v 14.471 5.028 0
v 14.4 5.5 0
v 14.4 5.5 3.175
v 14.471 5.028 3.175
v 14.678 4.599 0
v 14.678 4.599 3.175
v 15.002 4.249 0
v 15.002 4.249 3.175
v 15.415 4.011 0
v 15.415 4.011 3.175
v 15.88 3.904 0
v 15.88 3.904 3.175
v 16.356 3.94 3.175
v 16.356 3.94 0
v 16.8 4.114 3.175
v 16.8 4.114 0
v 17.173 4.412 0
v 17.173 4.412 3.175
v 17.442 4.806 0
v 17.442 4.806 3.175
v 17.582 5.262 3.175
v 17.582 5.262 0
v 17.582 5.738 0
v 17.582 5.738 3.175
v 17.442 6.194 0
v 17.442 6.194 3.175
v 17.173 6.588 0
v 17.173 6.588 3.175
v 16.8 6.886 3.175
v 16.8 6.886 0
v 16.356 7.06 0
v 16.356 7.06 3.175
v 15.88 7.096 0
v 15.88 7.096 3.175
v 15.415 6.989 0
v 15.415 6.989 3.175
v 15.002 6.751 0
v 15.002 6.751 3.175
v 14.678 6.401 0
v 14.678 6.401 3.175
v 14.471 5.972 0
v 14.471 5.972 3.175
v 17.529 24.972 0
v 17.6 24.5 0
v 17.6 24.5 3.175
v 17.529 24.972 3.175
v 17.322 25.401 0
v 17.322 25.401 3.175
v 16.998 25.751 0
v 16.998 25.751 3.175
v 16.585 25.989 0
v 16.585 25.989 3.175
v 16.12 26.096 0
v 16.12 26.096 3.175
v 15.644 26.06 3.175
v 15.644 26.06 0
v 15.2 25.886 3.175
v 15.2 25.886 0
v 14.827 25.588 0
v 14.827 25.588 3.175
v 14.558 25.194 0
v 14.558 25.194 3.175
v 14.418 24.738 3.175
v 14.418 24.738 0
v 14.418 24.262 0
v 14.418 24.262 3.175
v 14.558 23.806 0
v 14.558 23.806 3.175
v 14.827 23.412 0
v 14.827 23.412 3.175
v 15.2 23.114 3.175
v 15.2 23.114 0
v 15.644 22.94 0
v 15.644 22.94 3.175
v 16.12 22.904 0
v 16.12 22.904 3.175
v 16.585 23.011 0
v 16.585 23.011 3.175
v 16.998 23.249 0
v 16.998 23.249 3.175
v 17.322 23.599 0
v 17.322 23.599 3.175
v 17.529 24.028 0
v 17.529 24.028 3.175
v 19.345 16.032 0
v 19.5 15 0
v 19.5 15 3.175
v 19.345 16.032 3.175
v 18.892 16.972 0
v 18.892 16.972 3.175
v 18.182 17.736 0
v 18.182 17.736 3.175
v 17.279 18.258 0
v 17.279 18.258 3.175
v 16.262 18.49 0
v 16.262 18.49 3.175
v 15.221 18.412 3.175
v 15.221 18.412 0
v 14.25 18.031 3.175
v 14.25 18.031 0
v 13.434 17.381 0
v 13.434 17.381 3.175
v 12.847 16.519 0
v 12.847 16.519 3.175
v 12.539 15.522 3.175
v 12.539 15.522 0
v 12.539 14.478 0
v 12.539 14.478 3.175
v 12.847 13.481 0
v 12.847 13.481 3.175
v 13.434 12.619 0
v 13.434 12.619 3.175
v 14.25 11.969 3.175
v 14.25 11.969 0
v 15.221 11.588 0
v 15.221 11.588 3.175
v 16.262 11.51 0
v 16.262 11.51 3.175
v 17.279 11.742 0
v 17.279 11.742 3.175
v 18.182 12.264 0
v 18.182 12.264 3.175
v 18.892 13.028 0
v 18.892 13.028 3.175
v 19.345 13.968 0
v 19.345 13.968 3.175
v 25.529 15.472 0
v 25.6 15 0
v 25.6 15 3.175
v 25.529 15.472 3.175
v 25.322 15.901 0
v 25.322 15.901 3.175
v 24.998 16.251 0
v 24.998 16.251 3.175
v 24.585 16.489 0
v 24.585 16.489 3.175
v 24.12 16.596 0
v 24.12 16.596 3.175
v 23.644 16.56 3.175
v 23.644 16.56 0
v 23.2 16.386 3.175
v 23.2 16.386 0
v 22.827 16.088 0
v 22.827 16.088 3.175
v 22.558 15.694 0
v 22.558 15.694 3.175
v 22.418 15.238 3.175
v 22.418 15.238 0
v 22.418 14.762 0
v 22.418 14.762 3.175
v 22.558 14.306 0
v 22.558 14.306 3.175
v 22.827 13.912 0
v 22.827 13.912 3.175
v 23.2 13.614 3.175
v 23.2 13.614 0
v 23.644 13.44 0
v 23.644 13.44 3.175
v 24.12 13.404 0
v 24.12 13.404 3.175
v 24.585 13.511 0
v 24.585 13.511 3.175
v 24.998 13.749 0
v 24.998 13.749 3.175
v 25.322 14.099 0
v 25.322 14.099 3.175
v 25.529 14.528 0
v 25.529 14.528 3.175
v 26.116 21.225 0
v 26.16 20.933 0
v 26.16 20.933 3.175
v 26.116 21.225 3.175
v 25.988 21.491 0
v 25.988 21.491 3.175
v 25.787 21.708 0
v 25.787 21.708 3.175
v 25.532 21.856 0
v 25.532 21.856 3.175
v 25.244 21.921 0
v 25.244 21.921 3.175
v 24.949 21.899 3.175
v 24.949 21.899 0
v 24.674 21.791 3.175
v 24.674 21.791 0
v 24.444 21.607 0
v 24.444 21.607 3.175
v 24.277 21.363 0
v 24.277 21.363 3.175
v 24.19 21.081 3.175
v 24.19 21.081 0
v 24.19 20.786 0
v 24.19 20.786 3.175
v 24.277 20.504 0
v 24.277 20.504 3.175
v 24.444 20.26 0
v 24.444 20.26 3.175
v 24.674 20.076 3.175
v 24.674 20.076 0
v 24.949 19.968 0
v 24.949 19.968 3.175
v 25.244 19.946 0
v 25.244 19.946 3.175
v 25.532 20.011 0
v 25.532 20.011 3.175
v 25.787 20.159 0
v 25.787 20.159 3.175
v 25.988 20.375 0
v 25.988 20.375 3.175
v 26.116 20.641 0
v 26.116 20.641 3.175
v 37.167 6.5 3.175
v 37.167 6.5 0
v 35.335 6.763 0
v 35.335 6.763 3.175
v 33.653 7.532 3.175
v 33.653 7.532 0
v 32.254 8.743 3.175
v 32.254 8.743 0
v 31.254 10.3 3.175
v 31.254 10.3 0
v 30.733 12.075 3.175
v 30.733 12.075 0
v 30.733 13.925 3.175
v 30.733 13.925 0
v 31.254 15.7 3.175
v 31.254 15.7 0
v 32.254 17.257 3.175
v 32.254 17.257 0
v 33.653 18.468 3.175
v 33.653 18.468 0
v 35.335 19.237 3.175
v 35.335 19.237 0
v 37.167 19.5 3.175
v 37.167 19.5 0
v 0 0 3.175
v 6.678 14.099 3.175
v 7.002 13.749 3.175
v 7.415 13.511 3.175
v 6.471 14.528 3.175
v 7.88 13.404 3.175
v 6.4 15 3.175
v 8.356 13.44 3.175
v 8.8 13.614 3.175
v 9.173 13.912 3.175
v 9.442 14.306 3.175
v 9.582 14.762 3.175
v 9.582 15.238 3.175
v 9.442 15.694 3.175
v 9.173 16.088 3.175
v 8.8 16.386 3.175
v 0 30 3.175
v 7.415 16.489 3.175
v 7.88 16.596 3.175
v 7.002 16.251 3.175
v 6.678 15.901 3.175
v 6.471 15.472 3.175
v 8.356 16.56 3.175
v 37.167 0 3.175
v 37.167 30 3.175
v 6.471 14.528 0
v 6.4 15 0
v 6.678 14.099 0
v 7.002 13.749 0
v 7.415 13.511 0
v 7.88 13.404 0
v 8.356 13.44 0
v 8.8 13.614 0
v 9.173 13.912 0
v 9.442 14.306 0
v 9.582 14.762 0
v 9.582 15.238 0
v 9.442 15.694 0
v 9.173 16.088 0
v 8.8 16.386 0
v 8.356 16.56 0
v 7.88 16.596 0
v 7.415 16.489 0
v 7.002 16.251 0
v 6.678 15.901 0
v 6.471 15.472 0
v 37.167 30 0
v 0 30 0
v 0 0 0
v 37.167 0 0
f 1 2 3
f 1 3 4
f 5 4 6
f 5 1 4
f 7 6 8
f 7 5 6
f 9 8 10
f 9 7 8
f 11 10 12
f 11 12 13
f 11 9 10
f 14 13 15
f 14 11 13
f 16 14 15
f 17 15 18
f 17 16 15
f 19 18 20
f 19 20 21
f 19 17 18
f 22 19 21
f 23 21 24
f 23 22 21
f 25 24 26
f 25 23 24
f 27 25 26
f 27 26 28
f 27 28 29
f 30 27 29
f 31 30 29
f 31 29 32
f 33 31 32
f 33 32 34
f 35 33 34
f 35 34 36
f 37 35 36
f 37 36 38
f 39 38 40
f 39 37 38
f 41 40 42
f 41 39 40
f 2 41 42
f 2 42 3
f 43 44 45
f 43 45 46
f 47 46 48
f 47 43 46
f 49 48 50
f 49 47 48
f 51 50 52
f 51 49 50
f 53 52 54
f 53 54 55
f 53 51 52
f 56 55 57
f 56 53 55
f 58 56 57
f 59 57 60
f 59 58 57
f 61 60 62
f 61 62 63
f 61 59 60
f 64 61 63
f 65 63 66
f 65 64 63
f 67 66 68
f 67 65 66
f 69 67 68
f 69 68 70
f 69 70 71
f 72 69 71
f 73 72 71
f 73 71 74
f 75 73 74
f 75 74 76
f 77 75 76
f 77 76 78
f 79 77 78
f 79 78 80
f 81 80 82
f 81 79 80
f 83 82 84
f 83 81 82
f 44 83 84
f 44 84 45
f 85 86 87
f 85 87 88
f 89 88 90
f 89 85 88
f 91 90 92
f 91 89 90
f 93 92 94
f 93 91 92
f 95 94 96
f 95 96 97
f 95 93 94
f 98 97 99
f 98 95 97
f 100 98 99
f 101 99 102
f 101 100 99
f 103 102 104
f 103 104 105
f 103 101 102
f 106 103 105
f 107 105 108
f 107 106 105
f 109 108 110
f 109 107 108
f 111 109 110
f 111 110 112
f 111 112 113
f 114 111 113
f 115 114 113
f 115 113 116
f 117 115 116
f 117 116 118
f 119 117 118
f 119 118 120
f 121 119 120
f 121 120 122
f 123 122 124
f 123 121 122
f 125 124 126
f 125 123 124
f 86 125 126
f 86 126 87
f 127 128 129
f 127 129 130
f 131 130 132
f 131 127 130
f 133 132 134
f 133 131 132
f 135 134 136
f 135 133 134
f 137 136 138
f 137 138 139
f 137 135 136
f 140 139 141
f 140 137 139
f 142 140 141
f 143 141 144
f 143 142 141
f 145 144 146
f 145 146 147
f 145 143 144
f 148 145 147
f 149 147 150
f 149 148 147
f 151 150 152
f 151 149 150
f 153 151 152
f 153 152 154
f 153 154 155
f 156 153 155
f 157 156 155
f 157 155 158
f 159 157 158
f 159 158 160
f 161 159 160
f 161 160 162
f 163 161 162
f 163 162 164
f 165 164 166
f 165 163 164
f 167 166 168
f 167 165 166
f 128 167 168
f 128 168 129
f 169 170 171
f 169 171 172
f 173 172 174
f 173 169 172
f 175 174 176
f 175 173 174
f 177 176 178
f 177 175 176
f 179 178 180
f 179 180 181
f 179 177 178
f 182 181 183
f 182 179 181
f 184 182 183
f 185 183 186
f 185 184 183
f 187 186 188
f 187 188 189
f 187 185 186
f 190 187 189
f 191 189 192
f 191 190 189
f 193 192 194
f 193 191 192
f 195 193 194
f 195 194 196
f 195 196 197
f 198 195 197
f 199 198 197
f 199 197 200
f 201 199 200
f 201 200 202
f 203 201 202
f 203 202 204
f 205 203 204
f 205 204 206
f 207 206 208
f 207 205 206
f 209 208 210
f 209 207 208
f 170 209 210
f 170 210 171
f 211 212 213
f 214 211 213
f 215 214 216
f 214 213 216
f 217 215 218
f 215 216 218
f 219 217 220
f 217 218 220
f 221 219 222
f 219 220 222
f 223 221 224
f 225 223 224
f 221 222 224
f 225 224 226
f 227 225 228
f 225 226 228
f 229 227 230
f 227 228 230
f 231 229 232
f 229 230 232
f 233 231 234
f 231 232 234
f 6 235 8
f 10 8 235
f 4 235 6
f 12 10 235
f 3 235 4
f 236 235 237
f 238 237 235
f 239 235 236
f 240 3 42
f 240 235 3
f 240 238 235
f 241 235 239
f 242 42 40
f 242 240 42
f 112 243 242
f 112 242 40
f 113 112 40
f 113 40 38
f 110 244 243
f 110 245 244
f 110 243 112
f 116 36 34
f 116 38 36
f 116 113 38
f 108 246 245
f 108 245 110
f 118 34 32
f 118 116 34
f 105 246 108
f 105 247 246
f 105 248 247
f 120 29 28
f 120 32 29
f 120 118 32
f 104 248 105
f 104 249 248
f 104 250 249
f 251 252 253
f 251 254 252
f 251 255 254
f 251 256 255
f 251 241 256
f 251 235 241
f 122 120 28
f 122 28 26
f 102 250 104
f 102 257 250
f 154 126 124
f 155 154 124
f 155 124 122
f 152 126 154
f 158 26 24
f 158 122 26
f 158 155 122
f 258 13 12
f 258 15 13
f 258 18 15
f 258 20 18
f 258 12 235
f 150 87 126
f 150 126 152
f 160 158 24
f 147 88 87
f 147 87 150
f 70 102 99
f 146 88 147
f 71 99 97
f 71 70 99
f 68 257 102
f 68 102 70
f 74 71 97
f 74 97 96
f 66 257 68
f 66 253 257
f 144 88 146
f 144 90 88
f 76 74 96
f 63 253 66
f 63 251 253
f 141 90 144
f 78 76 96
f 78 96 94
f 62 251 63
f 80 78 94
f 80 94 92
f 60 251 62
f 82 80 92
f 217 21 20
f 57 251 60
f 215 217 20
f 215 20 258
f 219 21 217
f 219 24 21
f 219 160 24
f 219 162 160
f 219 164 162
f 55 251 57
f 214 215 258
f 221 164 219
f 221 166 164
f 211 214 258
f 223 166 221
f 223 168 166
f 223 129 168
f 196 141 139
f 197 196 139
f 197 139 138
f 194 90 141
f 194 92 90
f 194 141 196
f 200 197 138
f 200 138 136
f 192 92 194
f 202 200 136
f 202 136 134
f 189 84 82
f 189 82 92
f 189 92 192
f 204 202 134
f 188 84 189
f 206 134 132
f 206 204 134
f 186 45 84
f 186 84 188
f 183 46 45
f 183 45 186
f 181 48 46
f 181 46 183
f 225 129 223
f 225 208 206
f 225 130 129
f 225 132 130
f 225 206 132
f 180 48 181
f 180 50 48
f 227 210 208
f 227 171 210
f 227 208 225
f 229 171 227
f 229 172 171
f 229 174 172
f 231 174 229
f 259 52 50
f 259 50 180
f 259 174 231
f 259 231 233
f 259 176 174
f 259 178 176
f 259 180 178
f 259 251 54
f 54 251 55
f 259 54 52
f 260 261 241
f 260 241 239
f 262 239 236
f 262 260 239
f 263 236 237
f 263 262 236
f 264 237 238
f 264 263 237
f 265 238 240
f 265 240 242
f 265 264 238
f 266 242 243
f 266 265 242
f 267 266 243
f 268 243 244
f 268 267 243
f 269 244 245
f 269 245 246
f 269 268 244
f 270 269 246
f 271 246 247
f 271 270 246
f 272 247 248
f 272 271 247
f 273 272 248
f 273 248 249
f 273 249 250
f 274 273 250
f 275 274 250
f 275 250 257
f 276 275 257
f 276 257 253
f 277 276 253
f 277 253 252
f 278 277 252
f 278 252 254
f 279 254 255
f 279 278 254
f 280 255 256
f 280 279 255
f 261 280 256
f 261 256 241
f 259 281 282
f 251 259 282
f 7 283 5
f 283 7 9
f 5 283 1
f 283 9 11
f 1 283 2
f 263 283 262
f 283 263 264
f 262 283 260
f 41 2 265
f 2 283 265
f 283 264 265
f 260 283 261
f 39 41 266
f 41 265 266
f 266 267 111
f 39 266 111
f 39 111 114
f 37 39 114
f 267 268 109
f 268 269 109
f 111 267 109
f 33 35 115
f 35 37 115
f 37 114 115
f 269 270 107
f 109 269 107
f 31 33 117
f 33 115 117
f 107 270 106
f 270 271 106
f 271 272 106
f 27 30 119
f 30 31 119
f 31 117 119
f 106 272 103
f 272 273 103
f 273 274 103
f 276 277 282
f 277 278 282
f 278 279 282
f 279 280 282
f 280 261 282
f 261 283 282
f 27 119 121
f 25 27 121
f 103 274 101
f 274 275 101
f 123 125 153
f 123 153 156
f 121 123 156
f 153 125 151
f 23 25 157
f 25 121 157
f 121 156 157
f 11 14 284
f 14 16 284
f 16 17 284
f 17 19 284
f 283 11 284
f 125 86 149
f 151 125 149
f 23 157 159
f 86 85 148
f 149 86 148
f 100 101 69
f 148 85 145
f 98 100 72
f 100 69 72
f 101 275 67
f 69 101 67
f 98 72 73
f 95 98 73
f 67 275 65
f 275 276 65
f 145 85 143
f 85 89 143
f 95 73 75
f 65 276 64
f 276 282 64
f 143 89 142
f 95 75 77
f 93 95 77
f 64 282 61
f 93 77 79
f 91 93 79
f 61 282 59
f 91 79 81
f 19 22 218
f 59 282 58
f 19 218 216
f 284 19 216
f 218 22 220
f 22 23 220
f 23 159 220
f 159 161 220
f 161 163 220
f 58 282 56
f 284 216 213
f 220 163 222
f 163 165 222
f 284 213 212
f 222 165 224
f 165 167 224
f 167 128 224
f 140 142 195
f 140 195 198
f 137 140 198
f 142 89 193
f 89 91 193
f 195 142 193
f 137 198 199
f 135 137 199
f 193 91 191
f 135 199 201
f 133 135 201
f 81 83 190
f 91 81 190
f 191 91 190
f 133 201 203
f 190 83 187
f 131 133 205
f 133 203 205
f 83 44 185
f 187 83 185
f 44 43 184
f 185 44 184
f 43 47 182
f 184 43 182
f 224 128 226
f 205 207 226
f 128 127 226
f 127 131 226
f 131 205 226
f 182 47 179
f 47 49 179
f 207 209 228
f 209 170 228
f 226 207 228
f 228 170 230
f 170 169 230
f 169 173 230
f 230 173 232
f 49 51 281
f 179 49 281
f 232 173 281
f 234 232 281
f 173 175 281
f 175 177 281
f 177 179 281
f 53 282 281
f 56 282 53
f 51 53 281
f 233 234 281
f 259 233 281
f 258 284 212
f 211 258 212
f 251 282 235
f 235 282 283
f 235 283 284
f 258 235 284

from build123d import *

# Parameters (mm, degrees)
SKETCH1_R           = 0.9906
SKETCH1_R_2         = 1.6
SKETCH1_R_3         = 3.5
BOSS_EXTRUDE2_DEPTH = 3.175


with BuildPart() as part:
    # Sketch1 → Boss-Extrude2 (new body)
    with BuildSketch(Plane.XY):
        with BuildLine():
            Line((0, 0), (37.166699296, 0))
            Line((37.166699296, 0), (37.166699296, 6.5))
            ThreePointArc((37.166699296, 6.5), (30.666699296, 13), (37.166699296, 19.5))
            Line((37.166699296, 19.5), (37.166699296, 30))
            Line((37.166699296, 30), (0, 30))
            Line((0, 30), (0, 0))
        make_face()
        with Locations((25.169778966, 20.933400182)):
            Circle(SKETCH1_R, mode=Mode.SUBTRACT)
        with Locations((16, 24.5)):
            Circle(SKETCH1_R_2, mode=Mode.SUBTRACT)
        with Locations((24, 15)):
            Circle(SKETCH1_R_2, mode=Mode.SUBTRACT)
        with Locations(Location((16, 5.5, 0), (0, 0, 180))):
            Circle(SKETCH1_R_2, mode=Mode.SUBTRACT)
        with Locations(Location((8, 15, 0), (0, 0, 180))):
            Circle(SKETCH1_R_2, mode=Mode.SUBTRACT)
        with Locations((16, 15)):
            Circle(SKETCH1_R_3, mode=Mode.SUBTRACT)
    extrude(amount=BOSS_EXTRUDE2_DEPTH)


solid = part.part
